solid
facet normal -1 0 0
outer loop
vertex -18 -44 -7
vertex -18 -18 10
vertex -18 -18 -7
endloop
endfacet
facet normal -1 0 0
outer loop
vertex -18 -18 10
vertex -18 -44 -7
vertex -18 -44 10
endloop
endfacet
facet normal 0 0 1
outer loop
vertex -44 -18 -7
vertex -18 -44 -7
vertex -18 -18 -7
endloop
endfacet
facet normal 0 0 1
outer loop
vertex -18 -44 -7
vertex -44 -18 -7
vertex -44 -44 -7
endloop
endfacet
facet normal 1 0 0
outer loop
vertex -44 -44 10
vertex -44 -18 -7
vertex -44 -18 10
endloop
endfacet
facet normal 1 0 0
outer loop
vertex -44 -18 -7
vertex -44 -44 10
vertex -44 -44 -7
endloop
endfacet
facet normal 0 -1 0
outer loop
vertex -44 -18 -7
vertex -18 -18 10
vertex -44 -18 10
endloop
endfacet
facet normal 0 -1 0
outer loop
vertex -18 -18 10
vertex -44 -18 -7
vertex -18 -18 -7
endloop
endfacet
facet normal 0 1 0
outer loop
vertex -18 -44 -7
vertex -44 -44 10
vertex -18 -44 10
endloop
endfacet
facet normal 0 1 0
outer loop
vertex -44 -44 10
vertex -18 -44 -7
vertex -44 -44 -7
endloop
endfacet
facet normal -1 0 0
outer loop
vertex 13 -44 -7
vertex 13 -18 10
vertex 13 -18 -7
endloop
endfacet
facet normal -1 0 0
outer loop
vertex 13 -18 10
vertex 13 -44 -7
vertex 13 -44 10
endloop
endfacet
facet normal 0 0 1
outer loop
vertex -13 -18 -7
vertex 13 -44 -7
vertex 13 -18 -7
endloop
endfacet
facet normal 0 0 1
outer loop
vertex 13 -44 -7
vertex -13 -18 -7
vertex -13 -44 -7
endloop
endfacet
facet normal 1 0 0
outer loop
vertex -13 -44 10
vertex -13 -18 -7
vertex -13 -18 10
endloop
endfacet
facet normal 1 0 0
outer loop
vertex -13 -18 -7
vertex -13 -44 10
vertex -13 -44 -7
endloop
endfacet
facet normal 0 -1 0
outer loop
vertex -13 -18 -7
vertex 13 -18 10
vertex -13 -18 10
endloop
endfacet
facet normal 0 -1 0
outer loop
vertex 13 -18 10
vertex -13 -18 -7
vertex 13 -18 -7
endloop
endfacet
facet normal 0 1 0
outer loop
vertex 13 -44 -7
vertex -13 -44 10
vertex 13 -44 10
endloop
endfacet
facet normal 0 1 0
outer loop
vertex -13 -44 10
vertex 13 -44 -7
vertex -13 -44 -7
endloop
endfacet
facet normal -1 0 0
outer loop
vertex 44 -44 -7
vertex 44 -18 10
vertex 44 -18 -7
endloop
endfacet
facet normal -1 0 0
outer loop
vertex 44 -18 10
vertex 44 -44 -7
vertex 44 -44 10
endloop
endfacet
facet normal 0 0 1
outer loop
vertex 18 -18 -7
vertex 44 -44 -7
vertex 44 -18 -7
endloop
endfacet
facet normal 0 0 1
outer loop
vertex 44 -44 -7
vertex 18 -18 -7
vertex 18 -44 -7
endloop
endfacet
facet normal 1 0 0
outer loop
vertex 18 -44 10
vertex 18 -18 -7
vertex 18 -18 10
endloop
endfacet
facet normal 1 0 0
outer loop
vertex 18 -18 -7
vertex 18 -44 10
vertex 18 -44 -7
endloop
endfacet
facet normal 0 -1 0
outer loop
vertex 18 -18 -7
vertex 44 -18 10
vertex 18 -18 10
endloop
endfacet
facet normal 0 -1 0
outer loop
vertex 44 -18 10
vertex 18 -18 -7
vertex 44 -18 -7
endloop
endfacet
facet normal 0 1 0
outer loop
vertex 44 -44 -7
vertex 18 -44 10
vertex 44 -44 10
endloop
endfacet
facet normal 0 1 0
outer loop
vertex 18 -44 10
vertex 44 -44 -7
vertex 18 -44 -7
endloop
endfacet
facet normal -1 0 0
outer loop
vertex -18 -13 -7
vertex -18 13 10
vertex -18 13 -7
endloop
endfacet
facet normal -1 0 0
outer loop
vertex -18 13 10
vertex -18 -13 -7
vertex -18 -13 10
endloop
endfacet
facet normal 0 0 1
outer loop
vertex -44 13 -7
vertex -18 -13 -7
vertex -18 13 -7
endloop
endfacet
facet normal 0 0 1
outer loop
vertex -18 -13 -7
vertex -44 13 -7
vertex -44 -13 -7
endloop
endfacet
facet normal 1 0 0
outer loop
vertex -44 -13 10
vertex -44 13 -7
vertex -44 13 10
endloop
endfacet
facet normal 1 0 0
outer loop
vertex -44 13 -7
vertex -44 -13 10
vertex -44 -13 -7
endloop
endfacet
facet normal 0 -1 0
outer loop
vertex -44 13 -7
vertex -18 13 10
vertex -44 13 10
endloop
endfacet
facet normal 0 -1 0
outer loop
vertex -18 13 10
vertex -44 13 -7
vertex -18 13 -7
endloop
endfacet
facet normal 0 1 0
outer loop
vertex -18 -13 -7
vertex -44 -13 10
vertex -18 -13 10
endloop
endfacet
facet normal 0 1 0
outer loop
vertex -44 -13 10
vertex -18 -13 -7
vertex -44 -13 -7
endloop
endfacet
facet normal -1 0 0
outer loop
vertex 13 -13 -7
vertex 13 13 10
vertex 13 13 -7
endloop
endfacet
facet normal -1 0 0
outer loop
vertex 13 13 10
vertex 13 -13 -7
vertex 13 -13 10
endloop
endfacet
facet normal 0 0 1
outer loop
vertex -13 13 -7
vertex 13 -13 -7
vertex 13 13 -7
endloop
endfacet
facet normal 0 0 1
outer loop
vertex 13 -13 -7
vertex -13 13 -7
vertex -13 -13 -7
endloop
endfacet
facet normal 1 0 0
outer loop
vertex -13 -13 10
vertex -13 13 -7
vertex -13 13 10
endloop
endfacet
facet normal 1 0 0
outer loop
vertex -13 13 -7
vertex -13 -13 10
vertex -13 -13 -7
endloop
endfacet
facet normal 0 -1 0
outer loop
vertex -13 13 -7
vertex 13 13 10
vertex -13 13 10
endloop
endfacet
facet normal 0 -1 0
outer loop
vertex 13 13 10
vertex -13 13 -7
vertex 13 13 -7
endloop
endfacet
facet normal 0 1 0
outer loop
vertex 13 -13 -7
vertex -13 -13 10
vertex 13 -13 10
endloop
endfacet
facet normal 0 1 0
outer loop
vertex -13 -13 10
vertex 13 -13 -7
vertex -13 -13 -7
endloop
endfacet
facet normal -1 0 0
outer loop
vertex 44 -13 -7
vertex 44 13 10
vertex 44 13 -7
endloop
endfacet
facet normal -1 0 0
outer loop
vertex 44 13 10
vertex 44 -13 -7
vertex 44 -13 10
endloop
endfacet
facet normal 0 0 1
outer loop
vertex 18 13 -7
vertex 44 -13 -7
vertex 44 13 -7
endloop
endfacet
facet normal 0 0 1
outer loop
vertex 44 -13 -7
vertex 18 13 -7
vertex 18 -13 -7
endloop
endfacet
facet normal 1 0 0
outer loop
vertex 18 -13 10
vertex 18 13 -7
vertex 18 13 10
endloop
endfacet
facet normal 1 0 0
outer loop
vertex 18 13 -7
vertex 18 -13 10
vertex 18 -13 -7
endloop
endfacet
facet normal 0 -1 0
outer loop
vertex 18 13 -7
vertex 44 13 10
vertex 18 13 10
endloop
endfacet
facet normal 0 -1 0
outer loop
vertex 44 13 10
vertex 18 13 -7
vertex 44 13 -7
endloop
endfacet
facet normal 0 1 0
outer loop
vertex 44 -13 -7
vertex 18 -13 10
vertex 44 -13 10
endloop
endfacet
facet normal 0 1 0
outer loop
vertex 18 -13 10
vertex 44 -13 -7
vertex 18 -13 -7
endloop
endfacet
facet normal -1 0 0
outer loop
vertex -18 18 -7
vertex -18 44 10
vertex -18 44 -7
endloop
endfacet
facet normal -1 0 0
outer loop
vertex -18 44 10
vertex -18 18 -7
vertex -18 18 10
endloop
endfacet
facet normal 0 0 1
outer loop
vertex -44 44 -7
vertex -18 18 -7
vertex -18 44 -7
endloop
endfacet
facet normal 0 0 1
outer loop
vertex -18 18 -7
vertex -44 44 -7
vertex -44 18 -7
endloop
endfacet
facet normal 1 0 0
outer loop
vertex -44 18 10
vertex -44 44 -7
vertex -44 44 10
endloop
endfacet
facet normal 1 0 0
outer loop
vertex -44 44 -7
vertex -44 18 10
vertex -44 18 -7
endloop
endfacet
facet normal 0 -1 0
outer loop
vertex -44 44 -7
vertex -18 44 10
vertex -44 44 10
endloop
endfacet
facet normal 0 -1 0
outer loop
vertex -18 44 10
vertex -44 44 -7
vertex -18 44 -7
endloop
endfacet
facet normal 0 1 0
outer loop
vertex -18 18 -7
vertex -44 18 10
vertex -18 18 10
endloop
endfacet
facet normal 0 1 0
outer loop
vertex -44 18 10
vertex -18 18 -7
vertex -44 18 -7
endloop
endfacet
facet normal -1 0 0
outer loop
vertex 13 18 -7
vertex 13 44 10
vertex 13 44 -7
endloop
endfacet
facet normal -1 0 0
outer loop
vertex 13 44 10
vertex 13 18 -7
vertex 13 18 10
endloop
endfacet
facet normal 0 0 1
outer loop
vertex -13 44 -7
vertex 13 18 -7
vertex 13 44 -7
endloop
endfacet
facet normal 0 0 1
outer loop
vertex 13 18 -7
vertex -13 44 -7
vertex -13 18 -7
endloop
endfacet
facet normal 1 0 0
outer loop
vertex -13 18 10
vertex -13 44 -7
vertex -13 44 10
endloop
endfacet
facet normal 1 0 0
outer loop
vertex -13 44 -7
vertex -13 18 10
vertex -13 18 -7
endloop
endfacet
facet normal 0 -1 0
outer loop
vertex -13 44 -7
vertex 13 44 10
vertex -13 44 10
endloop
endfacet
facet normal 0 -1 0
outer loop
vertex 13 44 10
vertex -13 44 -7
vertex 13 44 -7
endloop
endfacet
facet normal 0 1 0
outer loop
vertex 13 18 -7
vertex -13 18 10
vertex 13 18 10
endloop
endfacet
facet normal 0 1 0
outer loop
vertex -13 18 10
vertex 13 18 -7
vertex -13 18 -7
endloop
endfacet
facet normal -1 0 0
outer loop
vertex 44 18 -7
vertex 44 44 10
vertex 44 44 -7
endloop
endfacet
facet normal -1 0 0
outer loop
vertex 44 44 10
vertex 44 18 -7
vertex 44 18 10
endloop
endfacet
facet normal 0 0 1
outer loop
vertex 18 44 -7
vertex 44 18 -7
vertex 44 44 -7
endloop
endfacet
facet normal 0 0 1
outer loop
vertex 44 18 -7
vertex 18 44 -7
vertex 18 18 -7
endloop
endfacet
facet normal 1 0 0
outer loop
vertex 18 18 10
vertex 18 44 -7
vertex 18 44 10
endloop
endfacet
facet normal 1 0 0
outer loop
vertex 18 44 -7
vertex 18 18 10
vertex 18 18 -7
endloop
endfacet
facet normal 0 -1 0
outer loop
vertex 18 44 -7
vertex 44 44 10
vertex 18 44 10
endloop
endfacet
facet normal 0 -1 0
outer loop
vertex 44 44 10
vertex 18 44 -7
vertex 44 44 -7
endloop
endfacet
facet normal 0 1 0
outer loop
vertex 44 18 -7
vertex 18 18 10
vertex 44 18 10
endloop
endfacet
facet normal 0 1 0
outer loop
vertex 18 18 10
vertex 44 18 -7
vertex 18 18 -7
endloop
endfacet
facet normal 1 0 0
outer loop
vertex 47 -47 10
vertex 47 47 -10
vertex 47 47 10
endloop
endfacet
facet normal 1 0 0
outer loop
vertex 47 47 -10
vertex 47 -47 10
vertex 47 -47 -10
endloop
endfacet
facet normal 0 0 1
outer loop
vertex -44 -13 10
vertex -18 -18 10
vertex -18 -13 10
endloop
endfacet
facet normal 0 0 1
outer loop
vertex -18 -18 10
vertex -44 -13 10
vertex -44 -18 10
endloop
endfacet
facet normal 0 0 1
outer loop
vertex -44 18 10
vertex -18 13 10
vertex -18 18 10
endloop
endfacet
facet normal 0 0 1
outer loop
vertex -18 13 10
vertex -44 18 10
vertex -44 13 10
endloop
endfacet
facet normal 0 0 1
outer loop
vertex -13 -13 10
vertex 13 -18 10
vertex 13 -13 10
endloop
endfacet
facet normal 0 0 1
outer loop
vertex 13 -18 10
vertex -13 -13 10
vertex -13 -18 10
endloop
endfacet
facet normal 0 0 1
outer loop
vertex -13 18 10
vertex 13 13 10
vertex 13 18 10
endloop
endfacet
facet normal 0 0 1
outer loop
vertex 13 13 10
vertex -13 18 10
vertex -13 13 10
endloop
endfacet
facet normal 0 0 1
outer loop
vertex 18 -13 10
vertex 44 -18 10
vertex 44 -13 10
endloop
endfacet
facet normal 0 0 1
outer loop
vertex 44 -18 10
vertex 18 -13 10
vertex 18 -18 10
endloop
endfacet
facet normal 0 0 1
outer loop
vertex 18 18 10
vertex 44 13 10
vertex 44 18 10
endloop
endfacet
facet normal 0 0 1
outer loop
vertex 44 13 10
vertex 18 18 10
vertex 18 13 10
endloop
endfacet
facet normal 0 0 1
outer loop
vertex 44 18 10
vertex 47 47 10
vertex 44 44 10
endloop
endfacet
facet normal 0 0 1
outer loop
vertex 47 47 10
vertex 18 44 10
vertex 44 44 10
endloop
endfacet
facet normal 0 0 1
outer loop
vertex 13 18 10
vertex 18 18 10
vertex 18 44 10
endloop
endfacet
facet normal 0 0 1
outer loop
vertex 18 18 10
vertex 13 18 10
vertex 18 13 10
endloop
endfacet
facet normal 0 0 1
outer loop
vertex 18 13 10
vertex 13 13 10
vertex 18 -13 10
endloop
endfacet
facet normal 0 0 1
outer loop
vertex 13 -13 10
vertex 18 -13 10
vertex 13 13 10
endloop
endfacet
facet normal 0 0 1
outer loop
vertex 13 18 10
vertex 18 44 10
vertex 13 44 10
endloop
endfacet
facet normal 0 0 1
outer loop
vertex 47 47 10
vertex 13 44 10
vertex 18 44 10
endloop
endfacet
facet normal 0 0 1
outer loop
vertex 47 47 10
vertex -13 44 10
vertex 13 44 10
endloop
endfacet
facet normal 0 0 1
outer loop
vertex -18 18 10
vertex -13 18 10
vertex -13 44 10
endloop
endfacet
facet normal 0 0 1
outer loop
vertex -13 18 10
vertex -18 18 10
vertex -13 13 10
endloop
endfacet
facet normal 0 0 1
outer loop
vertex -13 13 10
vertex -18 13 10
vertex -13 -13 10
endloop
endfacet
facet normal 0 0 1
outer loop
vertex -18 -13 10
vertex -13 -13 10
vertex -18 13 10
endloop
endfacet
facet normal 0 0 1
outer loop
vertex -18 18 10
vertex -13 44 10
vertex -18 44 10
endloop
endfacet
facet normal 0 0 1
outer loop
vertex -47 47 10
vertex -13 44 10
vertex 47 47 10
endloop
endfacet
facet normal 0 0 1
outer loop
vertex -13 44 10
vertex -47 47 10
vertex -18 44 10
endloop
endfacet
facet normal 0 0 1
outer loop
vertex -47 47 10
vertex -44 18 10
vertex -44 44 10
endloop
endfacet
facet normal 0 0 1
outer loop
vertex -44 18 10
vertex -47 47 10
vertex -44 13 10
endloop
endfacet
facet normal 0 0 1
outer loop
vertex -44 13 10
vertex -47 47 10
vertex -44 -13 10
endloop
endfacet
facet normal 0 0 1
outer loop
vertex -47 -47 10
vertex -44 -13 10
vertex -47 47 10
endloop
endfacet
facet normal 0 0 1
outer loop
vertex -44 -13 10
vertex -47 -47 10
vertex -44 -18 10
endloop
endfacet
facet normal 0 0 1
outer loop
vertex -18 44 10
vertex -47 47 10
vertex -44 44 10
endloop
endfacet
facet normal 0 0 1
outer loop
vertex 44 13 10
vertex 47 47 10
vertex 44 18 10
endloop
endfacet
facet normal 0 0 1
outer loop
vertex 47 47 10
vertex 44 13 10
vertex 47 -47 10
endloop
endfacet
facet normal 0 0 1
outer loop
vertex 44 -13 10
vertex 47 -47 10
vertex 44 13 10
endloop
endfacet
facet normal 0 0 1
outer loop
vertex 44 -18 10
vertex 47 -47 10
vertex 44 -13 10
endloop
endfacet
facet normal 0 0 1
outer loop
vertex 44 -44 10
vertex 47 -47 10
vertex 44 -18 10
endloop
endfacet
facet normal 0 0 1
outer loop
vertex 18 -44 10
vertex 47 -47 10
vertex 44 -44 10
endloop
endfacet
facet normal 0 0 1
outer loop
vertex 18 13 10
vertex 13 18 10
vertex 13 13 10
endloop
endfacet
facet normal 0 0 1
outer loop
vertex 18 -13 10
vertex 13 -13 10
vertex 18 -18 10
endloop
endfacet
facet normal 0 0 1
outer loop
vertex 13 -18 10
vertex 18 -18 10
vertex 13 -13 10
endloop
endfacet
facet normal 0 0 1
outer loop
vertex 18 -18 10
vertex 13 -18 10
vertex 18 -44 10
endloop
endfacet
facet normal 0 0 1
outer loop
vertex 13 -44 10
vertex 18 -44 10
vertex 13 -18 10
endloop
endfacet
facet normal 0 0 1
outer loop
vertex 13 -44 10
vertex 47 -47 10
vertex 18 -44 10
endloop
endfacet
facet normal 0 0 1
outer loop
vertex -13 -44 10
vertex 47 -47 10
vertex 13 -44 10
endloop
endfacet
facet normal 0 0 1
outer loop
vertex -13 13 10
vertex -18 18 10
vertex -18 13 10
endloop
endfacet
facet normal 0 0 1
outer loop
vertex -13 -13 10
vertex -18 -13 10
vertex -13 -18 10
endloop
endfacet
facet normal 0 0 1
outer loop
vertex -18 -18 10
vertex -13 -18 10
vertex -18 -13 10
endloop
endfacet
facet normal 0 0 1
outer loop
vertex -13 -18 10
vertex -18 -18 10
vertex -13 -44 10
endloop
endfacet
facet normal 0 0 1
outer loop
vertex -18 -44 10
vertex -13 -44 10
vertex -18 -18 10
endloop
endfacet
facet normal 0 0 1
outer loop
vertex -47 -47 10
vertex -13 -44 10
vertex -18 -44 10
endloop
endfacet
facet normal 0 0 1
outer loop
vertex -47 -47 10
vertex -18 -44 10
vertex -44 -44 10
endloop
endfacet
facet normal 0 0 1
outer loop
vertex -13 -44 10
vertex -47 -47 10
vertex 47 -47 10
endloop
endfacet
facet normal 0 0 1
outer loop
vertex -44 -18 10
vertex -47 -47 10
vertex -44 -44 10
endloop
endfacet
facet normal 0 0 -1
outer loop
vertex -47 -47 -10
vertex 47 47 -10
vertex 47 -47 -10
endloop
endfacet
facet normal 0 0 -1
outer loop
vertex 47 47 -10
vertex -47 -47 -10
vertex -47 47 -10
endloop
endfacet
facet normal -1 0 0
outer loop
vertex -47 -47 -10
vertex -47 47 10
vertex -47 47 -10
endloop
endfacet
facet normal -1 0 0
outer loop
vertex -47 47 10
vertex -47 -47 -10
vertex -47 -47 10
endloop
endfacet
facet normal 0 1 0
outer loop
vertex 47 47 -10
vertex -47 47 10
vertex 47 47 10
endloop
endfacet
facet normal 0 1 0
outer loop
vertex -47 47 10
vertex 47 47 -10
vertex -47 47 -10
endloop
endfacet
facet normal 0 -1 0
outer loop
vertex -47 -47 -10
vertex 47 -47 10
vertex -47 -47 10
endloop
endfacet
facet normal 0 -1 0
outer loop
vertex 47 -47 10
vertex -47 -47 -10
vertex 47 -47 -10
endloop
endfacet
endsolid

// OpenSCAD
$fn = 32;

// ----------------------------------------------------------------------
// Pocket plate 94 x 94 x 20
// 3 x 3 pockets 26 mm square, 17 mm deep
// ----------------------------------------------------------------------

// --- parameters (mm) ---
thickness = 20;  // plate thickness
floor_t = 3;     // material left under each pocket
pocket = 26;     // pocket side length
pitch_x = 31;    // pocket pitch along X
pitch_y = 31;    // pocket pitch along Y
cols = 3;        // pockets per row
rows = 3;        // rows of pockets

// --- derived feature positions (mm) ---
depth = thickness - floor_t;        // = 17   pocket depth, down to the floor
span_x = (cols - 1) * pitch_x;      // = 62   distance between outer pockets
span_y = (rows - 1) * pitch_y;      // = 62   distance between outer pocket rows
origin_x = -span_x / 2;             // = -31   X of the first pocket
origin_y = -span_y / 2;             // = -31   Y of the first pocket
plate = [span_x + pocket + 6, span_y + pocket + 6, thickness];  // = [94, 94, 20]   overall size: pockets plus 3 mm of wall on each side
feature_centers = [
  [origin_x + 0 * pitch_x, origin_y + 0 * pitch_y],
  [origin_x + 1 * pitch_x, origin_y + 0 * pitch_y],
  [origin_x + 2 * pitch_x, origin_y + 0 * pitch_y],
  [origin_x + 0 * pitch_x, origin_y + 1 * pitch_y],
  [origin_x + 1 * pitch_x, origin_y + 1 * pitch_y],
  [origin_x + 2 * pitch_x, origin_y + 1 * pitch_y],
  [origin_x + 0 * pitch_x, origin_y + 2 * pitch_y],
  [origin_x + 1 * pitch_x, origin_y + 2 * pitch_y],
  [origin_x + 2 * pitch_x, origin_y + 2 * pitch_y]
];   // pocket centres, used verbatim by the cutter loop

// plate outline, then one pocket per centre in feature_centers
difference() {
  cube(plate, center = true);
  for (centre = feature_centers)
    translate([centre[0] - pocket / 2, centre[1] - pocket / 2, plate[2] / 2 - depth])
      cube([pocket, pocket, depth + 1]);  // centred on the declared pocket centre
}
